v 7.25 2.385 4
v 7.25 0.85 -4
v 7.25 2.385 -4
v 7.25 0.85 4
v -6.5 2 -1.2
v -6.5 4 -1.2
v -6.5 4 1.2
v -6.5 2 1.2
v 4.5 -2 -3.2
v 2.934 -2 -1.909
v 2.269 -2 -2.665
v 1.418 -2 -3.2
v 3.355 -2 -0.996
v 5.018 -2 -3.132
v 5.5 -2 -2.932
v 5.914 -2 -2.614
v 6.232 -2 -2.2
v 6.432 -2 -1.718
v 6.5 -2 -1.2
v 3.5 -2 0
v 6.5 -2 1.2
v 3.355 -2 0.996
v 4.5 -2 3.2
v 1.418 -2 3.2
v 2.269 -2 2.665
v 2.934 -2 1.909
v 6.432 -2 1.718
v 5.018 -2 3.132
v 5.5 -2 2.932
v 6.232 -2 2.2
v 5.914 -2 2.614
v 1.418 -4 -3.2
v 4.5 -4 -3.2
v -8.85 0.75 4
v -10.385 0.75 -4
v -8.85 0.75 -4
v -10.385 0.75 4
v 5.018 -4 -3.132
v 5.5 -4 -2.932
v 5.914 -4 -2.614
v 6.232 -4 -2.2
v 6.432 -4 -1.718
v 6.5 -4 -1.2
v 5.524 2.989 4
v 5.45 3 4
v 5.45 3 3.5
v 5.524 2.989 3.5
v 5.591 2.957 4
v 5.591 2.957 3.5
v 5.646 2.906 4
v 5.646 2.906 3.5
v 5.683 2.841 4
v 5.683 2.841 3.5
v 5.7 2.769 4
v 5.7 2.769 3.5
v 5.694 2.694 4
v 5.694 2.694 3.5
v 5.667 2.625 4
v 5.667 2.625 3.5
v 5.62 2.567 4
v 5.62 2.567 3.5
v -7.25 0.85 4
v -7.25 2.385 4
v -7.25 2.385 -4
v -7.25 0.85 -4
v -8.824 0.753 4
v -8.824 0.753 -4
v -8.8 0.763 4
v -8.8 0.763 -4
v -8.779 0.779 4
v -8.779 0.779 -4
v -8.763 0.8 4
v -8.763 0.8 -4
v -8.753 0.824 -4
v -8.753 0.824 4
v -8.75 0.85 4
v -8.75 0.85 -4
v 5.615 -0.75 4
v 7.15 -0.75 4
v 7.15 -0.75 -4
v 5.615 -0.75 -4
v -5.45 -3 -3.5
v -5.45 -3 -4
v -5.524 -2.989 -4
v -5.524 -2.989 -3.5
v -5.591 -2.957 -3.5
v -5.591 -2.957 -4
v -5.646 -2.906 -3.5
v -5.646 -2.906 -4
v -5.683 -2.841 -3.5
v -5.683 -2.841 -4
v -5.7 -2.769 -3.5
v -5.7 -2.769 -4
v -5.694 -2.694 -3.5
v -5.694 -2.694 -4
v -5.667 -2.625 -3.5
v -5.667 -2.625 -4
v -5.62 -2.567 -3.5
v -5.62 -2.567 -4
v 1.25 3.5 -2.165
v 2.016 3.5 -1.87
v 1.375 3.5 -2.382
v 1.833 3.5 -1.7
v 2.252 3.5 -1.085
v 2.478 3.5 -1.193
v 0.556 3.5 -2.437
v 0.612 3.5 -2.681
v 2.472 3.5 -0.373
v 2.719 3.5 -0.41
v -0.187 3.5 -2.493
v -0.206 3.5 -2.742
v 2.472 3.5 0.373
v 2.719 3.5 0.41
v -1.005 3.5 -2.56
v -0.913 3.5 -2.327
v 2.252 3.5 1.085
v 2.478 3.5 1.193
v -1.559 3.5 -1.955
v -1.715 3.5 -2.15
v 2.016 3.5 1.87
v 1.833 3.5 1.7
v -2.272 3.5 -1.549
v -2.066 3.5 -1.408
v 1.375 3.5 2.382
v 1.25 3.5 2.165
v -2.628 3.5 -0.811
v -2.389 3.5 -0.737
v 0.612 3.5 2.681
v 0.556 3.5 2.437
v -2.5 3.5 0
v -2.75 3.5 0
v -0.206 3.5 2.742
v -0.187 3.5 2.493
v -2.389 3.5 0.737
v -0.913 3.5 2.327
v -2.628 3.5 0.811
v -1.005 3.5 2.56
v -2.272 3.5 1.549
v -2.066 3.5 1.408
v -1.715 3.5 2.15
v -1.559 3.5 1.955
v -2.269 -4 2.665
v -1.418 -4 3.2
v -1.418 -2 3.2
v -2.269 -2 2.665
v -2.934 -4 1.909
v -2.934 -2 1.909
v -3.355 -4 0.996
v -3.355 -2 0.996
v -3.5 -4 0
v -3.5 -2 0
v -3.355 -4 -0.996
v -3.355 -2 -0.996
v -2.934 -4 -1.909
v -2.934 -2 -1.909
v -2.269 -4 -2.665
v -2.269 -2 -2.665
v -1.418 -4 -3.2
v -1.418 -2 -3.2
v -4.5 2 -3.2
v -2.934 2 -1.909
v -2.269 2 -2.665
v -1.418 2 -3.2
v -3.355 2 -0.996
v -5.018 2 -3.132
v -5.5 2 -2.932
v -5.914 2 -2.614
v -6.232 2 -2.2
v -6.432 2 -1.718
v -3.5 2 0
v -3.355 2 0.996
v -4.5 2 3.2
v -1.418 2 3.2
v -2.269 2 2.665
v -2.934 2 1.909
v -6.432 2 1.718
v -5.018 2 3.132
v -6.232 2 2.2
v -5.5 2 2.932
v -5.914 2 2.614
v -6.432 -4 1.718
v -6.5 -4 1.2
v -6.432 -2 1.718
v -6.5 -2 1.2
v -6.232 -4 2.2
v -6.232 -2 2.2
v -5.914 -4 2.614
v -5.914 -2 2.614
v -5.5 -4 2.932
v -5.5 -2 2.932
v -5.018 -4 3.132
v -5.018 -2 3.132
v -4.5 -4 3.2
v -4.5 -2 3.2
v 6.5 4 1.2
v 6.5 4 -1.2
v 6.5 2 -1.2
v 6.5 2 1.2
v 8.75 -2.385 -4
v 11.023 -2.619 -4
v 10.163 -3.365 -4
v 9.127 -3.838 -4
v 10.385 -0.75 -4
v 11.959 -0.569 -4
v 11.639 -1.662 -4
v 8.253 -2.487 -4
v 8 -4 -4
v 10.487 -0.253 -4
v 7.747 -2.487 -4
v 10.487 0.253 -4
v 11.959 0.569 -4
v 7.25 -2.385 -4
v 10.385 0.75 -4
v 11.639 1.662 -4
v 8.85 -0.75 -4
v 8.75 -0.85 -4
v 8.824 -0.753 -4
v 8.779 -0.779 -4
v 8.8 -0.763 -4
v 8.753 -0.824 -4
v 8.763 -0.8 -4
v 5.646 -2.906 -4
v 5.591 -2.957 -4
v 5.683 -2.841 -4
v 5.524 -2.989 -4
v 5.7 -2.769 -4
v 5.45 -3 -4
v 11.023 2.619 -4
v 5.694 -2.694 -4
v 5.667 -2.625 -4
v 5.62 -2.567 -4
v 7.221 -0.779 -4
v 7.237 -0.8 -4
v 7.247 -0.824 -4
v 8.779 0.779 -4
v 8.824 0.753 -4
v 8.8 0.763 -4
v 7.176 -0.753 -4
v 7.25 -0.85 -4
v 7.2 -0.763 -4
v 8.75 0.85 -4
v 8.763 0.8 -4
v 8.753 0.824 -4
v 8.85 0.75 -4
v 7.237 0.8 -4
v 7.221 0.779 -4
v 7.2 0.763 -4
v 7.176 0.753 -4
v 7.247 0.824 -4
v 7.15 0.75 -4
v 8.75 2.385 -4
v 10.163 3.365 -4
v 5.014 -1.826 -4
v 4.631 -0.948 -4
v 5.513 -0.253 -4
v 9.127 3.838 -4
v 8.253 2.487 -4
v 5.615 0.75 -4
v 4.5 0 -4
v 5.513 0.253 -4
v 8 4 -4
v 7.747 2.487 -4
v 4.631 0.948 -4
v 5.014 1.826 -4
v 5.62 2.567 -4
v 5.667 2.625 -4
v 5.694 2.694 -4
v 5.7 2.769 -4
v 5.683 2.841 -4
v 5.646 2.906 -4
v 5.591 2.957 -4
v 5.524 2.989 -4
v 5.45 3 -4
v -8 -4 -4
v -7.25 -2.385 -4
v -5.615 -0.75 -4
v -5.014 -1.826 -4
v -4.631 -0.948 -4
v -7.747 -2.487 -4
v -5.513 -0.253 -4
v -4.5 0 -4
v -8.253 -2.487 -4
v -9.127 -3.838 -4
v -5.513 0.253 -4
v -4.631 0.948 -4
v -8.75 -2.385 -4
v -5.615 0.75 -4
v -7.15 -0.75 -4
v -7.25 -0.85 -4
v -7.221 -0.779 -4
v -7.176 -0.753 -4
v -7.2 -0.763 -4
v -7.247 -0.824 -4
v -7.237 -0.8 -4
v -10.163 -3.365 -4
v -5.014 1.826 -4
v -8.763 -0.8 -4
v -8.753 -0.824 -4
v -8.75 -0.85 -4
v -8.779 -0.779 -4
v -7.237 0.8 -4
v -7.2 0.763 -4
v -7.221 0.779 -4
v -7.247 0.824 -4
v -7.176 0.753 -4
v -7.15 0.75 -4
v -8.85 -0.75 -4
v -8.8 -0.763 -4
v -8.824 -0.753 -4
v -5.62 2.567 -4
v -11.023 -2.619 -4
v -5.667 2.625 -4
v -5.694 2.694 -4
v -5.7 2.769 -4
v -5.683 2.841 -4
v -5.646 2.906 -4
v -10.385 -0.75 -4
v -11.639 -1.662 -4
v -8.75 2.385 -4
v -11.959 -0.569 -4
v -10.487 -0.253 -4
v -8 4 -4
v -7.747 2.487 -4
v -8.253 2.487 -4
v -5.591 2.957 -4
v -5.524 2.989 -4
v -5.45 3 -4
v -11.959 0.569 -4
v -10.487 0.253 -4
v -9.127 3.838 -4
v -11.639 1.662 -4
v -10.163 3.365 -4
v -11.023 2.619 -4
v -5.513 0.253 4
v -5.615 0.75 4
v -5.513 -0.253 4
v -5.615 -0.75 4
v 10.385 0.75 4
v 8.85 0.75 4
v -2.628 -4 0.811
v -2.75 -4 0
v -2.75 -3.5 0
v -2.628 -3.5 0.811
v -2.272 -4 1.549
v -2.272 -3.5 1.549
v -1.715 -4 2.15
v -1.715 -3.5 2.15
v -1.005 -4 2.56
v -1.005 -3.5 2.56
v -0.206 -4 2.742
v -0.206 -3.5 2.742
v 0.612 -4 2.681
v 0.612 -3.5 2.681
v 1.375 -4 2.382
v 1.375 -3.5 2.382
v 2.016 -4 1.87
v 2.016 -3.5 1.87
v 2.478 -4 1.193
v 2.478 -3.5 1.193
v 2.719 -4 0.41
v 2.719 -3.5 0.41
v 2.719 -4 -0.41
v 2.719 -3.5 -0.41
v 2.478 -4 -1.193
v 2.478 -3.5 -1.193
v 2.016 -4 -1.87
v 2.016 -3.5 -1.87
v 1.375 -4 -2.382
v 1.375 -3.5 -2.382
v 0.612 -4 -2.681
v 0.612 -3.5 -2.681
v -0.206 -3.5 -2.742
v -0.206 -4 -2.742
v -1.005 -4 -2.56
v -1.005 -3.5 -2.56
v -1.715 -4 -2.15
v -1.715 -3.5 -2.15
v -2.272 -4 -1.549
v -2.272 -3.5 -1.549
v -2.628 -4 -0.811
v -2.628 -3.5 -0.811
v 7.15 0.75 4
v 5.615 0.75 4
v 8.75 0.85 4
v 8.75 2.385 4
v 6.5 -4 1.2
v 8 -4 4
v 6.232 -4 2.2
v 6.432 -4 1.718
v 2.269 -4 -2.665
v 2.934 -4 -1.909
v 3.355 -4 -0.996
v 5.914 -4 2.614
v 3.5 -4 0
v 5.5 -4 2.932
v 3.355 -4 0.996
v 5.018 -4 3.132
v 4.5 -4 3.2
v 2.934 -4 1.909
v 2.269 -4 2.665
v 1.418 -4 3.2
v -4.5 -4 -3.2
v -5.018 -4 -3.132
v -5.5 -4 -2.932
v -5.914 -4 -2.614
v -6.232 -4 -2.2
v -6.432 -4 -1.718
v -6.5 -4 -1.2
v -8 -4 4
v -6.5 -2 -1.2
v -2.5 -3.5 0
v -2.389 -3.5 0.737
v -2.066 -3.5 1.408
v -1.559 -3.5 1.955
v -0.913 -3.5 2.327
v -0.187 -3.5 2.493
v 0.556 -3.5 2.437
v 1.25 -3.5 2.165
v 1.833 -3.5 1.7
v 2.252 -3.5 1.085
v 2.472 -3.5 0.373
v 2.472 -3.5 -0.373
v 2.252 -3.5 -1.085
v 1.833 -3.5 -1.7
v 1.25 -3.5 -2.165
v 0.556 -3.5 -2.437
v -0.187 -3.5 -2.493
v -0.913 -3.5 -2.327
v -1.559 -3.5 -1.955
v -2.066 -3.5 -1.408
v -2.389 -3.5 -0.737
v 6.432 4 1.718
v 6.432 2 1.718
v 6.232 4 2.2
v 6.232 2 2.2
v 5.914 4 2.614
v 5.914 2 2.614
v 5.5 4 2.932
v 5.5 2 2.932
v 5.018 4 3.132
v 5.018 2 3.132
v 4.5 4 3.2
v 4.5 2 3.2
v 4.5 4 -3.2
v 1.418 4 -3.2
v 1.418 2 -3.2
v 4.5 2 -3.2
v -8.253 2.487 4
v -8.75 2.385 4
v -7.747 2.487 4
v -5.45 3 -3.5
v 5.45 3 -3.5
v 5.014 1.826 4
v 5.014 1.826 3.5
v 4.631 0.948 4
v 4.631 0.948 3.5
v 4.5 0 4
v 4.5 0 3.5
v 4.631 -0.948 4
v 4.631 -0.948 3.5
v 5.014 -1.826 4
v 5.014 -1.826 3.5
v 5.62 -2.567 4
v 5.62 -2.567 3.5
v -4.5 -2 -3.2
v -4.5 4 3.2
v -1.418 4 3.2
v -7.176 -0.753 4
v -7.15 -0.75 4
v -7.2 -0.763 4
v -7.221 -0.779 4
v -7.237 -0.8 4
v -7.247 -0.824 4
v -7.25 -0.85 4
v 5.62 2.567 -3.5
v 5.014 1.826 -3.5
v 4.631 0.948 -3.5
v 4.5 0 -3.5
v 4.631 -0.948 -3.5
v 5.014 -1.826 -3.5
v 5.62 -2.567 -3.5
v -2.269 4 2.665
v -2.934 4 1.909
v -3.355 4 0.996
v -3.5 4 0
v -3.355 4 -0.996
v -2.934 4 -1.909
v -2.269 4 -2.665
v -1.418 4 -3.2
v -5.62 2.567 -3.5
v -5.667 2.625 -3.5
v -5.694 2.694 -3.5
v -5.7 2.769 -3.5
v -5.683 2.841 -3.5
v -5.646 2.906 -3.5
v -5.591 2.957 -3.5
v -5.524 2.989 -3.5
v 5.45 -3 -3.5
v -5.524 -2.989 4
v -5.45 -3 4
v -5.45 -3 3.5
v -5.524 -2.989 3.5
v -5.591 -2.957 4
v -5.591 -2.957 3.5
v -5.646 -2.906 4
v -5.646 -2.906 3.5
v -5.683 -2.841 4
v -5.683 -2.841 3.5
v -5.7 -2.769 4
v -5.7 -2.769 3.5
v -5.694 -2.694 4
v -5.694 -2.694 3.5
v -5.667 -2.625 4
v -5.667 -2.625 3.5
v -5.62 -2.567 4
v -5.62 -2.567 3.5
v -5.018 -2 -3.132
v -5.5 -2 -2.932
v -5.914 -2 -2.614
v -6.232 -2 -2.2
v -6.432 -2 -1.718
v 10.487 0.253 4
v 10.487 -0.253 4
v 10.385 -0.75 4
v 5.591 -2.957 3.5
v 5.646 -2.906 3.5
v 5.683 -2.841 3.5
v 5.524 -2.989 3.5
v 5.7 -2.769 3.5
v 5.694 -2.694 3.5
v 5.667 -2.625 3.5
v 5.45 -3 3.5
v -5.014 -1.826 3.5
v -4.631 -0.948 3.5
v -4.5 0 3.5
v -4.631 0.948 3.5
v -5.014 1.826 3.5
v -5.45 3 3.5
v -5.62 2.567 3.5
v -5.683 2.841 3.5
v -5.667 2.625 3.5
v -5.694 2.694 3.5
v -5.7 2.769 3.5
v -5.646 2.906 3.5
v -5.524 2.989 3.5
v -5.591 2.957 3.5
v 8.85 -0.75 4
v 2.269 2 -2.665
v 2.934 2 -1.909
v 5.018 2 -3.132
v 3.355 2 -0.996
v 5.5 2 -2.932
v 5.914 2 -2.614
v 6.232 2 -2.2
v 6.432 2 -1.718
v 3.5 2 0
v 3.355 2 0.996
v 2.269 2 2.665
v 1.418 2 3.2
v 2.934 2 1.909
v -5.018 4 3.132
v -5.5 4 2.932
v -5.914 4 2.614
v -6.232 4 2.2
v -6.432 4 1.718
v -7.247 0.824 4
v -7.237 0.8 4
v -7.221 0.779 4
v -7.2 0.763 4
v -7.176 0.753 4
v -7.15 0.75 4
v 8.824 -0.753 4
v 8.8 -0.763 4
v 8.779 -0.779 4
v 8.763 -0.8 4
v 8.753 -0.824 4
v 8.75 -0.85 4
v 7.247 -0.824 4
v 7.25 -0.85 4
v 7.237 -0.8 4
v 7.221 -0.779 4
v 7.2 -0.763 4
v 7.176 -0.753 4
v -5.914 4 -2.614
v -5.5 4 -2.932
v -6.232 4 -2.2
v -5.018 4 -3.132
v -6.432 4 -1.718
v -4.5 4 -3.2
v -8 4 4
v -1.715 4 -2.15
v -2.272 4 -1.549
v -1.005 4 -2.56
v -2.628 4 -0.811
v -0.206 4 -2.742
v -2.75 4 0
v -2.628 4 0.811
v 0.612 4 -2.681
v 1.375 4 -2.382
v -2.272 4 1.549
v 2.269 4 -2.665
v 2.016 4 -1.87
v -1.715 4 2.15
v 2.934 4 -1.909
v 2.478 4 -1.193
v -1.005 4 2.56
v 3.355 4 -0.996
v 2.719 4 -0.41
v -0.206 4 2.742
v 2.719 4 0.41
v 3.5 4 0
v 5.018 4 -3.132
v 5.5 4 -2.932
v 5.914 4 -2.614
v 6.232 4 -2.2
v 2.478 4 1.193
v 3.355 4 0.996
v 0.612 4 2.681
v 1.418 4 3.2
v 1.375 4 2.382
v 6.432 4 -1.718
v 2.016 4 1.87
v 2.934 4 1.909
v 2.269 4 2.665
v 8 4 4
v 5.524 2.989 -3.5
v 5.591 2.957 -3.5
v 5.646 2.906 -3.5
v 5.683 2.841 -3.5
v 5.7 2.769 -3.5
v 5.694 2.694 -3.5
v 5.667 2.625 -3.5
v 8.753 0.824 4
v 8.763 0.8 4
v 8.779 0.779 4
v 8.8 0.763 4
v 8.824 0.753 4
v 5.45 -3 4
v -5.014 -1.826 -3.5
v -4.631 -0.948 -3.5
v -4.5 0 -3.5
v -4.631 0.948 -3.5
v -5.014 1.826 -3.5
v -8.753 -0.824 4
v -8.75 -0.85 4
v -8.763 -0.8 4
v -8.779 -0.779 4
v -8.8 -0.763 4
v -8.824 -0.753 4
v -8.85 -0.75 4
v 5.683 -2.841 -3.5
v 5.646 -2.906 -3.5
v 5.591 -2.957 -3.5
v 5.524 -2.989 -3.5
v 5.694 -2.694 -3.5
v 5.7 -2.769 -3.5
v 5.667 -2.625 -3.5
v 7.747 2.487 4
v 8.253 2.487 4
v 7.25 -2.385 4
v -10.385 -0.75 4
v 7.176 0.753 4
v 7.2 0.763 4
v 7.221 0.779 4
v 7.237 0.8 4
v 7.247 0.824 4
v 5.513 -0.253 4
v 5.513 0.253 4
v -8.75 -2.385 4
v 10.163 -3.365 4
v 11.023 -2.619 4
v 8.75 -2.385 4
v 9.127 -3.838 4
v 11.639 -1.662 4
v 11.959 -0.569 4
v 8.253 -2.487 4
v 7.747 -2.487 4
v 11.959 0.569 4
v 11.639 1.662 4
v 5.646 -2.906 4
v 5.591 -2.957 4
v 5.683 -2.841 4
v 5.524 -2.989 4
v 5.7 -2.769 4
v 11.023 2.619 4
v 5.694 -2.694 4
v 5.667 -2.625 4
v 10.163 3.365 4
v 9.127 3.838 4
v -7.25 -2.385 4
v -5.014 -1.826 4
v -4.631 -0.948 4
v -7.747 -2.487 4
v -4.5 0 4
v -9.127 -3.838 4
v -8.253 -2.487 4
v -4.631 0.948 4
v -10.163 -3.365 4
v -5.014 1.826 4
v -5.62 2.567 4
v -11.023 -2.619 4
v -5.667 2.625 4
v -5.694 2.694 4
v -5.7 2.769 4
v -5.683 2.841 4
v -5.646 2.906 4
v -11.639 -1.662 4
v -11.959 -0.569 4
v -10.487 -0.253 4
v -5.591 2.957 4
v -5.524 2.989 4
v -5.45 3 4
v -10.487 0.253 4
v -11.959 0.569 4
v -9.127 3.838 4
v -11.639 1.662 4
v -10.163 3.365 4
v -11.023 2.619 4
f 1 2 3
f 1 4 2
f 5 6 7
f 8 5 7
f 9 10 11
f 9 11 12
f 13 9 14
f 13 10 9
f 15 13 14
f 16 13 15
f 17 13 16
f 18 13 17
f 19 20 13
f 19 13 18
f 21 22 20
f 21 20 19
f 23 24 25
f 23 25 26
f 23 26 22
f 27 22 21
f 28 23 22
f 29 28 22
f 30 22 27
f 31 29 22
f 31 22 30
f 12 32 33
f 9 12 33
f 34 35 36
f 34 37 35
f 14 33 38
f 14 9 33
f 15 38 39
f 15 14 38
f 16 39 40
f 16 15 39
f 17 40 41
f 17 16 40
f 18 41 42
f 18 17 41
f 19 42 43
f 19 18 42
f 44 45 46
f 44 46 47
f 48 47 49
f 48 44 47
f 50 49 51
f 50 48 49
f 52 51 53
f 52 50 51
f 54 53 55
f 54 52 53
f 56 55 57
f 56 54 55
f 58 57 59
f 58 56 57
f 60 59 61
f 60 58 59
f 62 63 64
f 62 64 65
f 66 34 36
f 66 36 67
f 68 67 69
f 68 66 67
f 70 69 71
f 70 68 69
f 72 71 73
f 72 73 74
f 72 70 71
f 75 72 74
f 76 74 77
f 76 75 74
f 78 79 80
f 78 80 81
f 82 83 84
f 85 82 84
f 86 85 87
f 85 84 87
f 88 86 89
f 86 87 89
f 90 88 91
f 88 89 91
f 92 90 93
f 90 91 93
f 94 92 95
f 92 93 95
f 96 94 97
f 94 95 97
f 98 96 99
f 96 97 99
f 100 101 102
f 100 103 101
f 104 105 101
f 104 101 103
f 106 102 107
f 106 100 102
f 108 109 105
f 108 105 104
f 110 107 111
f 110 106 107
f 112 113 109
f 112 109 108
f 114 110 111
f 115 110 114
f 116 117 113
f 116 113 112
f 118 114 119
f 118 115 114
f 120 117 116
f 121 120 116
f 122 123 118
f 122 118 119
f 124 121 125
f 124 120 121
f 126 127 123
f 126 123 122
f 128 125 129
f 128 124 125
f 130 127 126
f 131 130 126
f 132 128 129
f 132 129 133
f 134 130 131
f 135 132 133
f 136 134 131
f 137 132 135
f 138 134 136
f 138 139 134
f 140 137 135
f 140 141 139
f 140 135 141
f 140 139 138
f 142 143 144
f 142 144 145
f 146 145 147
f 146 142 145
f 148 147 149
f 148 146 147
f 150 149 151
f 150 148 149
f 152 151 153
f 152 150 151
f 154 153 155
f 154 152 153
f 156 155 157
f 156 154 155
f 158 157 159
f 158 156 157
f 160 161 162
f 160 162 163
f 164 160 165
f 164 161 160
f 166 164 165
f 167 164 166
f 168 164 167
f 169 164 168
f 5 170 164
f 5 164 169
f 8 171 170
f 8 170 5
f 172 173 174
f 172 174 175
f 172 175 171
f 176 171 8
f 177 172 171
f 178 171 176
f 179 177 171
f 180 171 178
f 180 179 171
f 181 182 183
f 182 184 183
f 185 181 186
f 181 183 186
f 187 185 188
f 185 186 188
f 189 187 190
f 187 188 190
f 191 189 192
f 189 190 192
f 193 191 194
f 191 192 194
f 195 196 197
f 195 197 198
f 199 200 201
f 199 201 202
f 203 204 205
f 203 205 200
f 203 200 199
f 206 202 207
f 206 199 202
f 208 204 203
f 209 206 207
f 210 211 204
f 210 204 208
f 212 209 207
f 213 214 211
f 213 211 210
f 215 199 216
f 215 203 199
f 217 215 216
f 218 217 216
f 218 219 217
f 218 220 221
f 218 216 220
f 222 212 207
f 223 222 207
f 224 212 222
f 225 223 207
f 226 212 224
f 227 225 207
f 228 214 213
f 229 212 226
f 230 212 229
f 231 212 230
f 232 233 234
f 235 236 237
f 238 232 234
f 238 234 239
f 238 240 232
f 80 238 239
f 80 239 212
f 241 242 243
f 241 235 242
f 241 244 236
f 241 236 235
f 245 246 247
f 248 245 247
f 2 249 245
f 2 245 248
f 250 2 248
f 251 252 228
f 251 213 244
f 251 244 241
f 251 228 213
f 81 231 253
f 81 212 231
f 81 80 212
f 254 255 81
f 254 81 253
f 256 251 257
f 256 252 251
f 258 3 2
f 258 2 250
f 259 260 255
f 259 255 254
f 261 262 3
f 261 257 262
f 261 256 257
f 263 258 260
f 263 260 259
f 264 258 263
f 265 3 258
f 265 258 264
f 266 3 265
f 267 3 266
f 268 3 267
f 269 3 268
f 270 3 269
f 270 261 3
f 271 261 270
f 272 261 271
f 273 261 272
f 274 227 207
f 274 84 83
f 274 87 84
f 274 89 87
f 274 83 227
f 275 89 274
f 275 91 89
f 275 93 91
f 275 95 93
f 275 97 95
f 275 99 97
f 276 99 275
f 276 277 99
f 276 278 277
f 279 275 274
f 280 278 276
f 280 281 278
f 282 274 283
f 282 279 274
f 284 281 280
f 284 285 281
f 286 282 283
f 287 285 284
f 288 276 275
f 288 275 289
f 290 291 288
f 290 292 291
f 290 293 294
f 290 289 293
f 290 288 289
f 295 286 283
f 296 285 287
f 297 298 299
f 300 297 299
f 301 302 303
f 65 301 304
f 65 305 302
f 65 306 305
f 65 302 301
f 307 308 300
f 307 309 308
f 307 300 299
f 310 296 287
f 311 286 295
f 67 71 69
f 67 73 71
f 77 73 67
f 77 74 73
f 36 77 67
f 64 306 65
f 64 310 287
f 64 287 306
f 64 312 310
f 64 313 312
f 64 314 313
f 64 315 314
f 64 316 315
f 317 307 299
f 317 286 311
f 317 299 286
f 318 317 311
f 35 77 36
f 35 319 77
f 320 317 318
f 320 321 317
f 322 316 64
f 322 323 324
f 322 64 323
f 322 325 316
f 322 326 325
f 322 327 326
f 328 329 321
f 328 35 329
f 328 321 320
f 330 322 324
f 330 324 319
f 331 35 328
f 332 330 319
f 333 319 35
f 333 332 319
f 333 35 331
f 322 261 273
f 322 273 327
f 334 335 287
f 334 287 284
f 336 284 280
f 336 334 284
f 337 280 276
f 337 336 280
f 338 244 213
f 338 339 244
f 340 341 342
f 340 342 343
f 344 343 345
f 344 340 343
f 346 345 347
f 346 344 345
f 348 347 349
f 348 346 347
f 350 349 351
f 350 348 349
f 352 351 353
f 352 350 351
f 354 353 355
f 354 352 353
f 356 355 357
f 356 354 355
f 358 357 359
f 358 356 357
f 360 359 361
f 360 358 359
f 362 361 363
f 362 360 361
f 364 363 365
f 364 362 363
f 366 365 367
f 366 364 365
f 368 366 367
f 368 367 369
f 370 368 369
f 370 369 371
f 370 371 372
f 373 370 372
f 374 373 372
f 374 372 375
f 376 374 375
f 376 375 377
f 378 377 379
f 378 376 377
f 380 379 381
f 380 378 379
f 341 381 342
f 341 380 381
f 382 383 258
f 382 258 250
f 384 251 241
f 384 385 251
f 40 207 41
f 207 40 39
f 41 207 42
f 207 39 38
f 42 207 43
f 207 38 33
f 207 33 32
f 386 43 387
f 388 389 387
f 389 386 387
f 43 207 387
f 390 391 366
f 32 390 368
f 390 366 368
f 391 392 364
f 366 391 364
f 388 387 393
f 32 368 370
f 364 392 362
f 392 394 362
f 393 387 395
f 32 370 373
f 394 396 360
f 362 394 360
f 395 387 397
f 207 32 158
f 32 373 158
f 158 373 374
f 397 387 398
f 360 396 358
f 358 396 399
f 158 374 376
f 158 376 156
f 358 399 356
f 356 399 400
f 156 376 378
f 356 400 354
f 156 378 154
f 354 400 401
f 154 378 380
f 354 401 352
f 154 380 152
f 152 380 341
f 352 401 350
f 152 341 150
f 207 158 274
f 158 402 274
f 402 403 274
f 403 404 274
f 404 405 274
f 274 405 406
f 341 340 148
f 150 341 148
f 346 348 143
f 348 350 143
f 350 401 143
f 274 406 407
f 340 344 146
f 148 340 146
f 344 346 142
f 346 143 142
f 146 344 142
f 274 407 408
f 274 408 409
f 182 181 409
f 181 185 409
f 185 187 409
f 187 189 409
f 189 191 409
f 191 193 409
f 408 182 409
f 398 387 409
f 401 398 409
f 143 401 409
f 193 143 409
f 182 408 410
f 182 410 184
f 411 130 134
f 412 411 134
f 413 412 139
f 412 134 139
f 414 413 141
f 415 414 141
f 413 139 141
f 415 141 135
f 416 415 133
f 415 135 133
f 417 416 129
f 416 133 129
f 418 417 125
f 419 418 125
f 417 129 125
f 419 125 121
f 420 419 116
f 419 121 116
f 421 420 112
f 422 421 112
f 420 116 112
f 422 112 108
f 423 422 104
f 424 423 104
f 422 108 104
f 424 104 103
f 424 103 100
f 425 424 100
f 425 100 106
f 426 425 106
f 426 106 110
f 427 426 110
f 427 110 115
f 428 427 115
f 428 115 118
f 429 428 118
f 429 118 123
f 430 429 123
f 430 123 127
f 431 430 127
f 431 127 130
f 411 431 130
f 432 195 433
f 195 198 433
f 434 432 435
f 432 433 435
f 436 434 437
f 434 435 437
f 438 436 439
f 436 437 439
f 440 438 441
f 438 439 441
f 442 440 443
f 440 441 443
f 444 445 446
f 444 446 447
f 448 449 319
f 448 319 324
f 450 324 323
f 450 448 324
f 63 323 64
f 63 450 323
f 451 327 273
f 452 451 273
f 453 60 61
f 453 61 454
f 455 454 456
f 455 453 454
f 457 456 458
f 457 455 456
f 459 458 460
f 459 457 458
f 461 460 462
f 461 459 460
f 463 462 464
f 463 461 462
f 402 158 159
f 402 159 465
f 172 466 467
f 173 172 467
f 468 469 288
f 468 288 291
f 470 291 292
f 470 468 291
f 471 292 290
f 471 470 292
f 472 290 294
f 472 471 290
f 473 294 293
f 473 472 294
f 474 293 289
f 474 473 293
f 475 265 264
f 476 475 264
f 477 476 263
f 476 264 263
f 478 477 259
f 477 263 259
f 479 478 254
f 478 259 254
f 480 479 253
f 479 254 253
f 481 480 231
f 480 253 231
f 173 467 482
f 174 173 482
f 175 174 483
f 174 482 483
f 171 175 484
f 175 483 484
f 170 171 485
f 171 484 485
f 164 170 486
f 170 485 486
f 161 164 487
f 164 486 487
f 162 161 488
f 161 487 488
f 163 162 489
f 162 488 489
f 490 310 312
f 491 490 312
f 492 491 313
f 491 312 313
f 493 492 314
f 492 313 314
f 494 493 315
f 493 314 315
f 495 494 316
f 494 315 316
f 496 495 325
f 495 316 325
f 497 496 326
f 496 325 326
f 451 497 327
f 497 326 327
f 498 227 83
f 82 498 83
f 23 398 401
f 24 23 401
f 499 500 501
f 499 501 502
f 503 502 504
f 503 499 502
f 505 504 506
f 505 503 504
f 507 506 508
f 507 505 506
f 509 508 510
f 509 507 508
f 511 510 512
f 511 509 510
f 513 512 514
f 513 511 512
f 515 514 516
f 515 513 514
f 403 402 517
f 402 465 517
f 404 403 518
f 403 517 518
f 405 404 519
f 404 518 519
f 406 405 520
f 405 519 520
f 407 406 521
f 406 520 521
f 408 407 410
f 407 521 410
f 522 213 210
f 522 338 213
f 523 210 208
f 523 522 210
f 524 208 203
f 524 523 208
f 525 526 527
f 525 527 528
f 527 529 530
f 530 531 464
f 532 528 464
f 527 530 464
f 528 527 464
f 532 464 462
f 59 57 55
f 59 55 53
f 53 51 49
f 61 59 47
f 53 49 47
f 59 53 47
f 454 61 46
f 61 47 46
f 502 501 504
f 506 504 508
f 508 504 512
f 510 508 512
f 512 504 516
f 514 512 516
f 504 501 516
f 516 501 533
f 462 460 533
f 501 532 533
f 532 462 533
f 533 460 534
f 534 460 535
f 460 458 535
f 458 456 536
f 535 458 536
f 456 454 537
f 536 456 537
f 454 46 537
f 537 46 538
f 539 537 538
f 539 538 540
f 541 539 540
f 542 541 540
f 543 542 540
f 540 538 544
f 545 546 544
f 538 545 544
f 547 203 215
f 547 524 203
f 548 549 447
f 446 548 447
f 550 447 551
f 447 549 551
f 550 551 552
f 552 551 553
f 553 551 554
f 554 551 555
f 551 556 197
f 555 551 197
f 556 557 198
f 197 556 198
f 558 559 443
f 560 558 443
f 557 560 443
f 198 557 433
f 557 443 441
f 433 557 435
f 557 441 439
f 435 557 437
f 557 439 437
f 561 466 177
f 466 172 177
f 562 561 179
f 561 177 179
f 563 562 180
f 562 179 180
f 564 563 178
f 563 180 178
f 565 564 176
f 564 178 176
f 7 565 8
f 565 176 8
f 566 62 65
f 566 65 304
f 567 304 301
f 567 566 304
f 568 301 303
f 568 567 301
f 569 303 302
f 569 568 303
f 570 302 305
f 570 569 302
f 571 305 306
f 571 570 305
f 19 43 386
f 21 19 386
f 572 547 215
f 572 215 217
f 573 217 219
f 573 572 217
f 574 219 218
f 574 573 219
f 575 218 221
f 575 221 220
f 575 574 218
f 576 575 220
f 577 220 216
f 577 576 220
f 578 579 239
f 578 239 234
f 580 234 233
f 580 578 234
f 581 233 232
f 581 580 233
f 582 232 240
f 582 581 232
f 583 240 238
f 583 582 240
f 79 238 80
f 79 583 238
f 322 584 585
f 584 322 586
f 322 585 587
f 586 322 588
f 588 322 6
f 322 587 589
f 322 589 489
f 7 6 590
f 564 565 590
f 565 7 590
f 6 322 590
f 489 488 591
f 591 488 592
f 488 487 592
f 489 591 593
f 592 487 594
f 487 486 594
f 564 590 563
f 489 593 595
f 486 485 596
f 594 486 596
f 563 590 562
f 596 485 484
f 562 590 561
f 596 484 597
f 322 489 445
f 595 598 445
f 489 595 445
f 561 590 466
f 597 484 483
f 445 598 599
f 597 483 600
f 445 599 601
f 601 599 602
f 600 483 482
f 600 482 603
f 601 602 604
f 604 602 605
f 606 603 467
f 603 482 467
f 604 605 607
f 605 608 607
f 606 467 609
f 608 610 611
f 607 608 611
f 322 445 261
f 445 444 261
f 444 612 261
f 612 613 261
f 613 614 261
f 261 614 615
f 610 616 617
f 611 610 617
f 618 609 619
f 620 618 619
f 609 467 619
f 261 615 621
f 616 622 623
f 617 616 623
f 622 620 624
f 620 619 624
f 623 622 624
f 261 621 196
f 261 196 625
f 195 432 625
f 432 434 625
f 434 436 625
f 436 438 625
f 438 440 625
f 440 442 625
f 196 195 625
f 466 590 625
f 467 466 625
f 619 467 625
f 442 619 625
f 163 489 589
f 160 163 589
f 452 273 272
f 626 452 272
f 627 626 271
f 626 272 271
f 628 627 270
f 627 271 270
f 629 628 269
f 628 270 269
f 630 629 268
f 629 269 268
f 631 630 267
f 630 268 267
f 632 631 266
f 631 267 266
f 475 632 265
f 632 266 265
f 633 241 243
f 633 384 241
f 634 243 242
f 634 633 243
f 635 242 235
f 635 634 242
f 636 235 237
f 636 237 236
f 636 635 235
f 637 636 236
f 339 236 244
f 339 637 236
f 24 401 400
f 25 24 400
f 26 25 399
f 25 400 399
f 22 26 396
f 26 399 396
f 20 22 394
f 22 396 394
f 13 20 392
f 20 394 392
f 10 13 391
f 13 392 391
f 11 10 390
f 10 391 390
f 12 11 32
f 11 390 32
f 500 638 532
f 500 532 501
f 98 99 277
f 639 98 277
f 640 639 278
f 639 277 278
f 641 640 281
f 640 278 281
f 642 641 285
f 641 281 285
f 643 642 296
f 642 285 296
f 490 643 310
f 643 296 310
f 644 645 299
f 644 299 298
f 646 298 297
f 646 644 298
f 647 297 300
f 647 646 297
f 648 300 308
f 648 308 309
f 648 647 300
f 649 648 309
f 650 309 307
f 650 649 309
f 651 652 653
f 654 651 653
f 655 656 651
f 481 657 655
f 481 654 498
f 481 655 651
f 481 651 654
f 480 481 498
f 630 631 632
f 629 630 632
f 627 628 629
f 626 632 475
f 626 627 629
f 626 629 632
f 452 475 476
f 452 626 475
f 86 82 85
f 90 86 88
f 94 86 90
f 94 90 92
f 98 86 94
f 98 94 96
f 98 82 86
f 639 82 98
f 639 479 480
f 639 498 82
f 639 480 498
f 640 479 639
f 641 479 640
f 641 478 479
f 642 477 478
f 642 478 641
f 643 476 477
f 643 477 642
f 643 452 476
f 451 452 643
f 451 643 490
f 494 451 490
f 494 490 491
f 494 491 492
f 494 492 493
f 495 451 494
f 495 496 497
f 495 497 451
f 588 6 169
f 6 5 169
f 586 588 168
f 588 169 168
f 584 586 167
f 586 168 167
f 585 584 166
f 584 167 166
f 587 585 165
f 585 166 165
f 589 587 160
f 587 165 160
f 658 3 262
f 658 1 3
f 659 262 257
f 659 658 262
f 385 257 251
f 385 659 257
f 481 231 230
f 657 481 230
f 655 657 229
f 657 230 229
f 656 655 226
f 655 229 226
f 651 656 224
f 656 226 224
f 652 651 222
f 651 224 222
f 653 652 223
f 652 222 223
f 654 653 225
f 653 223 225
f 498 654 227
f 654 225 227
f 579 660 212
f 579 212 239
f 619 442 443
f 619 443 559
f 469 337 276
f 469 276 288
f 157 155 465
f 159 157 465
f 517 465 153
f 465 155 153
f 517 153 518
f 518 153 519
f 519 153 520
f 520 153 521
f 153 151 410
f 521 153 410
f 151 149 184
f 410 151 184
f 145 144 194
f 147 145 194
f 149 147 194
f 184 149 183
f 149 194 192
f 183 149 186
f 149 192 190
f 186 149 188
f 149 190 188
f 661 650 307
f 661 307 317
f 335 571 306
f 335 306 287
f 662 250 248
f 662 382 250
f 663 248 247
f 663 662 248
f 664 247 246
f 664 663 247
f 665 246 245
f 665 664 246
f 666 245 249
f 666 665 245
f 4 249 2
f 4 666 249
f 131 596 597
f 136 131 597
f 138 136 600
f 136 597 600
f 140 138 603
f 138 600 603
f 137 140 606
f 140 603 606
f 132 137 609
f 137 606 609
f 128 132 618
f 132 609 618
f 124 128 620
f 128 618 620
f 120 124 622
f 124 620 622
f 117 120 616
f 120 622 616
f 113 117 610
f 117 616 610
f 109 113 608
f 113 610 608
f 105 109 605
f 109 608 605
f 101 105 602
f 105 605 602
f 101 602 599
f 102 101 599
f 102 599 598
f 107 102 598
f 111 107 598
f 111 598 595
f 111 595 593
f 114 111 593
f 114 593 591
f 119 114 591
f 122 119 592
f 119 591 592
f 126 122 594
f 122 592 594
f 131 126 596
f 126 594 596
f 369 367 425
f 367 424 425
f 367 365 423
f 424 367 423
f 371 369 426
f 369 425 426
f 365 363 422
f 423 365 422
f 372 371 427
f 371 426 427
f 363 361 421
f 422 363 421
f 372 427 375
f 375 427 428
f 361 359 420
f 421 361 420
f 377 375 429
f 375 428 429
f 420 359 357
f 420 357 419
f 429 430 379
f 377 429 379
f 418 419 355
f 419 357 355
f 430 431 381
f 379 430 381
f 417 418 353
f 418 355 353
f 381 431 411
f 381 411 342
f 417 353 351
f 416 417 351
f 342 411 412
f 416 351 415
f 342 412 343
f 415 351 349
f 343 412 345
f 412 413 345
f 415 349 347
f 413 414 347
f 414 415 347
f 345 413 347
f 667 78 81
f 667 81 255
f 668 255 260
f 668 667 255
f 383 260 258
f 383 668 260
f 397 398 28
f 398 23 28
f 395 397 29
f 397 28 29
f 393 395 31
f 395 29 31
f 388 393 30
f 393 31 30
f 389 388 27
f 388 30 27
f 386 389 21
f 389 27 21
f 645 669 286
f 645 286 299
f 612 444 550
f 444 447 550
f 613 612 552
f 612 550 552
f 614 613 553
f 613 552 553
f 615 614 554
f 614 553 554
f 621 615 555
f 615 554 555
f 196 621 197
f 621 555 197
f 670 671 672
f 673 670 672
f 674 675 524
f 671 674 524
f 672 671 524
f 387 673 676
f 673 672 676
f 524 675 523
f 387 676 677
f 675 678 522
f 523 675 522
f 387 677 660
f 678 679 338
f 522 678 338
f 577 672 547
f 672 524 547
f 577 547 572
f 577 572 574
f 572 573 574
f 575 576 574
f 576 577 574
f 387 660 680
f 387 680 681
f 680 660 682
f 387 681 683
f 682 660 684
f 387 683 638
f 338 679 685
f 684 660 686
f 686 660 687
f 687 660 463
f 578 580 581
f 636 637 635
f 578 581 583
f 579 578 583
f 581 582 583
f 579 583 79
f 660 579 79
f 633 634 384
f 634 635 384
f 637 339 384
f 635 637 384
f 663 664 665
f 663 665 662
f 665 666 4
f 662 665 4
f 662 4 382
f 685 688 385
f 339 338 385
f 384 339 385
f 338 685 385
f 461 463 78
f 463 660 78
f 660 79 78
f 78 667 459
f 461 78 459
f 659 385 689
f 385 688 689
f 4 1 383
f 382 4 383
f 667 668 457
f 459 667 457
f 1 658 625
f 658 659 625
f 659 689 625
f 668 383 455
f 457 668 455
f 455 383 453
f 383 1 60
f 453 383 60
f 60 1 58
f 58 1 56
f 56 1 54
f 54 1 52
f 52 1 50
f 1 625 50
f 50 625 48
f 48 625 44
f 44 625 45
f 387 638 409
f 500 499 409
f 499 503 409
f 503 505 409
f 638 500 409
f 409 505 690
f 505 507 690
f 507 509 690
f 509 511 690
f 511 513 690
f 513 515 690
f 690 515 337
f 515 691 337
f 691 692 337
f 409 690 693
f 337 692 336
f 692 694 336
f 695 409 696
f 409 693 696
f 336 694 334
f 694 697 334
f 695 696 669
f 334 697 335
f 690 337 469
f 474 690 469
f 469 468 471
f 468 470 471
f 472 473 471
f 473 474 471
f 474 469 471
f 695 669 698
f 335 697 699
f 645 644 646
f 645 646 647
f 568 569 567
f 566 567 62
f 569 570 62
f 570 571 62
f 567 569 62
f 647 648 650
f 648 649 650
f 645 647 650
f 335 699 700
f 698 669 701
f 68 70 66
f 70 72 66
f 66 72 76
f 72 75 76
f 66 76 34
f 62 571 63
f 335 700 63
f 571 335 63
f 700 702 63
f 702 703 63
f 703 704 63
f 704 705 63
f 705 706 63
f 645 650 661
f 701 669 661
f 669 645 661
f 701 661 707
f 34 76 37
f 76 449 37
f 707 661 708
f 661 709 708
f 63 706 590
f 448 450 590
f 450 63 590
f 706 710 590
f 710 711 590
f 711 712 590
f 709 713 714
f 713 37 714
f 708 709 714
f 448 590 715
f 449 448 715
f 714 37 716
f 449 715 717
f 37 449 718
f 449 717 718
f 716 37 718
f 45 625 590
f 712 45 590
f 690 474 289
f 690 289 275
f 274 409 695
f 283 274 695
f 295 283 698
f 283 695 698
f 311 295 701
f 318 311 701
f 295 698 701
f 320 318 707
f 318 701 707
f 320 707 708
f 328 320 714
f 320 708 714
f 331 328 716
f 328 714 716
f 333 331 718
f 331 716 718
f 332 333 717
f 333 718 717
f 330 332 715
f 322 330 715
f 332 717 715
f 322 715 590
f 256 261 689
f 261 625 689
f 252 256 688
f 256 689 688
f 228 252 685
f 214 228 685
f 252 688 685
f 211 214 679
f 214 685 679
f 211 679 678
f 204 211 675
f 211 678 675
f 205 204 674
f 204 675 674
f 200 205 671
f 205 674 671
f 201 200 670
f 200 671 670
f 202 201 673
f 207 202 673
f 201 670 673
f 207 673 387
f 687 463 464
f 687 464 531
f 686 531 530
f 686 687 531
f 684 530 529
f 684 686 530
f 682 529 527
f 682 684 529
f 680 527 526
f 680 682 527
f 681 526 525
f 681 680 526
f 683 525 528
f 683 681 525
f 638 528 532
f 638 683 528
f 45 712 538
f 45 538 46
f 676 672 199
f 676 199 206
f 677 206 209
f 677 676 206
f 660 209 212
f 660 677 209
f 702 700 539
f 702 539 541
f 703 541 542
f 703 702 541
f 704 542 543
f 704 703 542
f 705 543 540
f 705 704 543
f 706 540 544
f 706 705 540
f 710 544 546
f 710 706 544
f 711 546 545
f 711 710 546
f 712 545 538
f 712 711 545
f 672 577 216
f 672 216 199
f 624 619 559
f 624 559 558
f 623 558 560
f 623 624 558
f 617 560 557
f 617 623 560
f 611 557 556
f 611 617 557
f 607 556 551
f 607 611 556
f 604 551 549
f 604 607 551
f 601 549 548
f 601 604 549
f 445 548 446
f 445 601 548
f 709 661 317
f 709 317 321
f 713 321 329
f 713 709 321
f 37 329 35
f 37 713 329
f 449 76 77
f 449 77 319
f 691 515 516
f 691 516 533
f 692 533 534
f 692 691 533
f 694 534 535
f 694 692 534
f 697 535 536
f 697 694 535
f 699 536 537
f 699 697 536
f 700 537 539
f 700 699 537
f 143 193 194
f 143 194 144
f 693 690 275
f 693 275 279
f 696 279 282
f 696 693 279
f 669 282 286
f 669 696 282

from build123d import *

# Parameters (mm, degrees)
EXTRUIR1_DEPTH         = 4
CROQUIS2_R             = 2.5
CORTAR_EXTRUIR1_DEPTH  = 9
CROQUIS3_R             = 2.75
CORTAR_EXTRUIR2_DEPTH  = 0.5
CORTAR_EXTRUIR3_DEPTH  = 2
SIMETR_A3_COPY_1_DEPTH = 2
REDONDEO1_R            = 2
CORTAR_EXTRUIR4_DEPTH  = 0.5


with BuildPart() as part:
    # Croquis1 → Extruir1 (new body, symmetric)
    with BuildSketch(Plane.XY):
        with BuildLine():
            Line((-8, 4), (8, 4))
            ThreePointArc((8, 4), (12, 0), (8, -4))
            Line((8, -4), (-8, -4))
            ThreePointArc((-8, -4), (-12, 0), (-8, 4))
        make_face()
        with BuildLine():
            Line((10.384848004, -0.75), (8.85, -0.75))
            ThreePointArc((8.85, -0.75), (8.779289322, -0.779289322), (8.75, -0.85))
            Line((8.75, -0.85), (8.75, -2.384848004))
            ThreePointArc((8.75, -2.384848004), (8, -2.5), (7.25, -2.384848004))
            Line((7.25, -2.384848004), (7.25, -0.85))
            ThreePointArc((7.25, -0.85), (7.220710678, -0.779289322), (7.15, -0.75))
            Line((7.15, -0.75), (5.615151996, -0.75))
            ThreePointArc((5.615151996, -0.75), (5.5, 0), (5.615151996, 0.75))
            Line((5.615151996, 0.75), (7.15, 0.75))
            ThreePointArc((7.15, 0.75), (7.220710678, 0.779289322), (7.25, 0.85))
            Line((7.25, 0.85), (7.25, 2.384848004))
            ThreePointArc((7.25, 2.384848004), (8, 2.5), (8.75, 2.384848004))
            Line((8.75, 2.384848004), (8.75, 0.85))
            ThreePointArc((8.75, 0.85), (8.779289322, 0.779289322), (8.85, 0.75))
            Line((8.85, 0.75), (10.384848004, 0.75))
            ThreePointArc((10.384848004, 0.75), (10.5, 0), (10.384848004, -0.75))
        make_face(mode=Mode.SUBTRACT)
        with BuildLine():
            Line((-10.384848004, 0.75), (-8.85, 0.75))
            ThreePointArc((-8.85, 0.75), (-8.779289322, 0.779289322), (-8.75, 0.85))
            Line((-8.75, 0.85), (-8.75, 2.384848004))
            ThreePointArc((-8.75, 2.384848004), (-8, 2.5), (-7.25, 2.384848004))
            Line((-7.25, 2.384848004), (-7.25, 0.85))
            ThreePointArc((-7.25, 0.85), (-7.220710678, 0.779289322), (-7.15, 0.75))
            Line((-7.15, 0.75), (-5.615151996, 0.75))
            ThreePointArc((-5.615151996, 0.75), (-5.5, 0), (-5.615151996, -0.75))
            Line((-5.615151996, -0.75), (-7.15, -0.75))
            ThreePointArc((-7.15, -0.75), (-7.220710678, -0.779289322), (-7.25, -0.85))
            Line((-7.25, -0.85), (-7.25, -2.384848004))
            ThreePointArc((-7.25, -2.384848004), (-8, -2.5), (-8.75, -2.384848004))
            Line((-8.75, -2.384848004), (-8.75, -0.85))
            ThreePointArc((-8.75, -0.85), (-8.779289322, -0.779289322), (-8.85, -0.75))
            Line((-8.85, -0.75), (-10.384848004, -0.75))
            ThreePointArc((-10.384848004, -0.75), (-10.5, 0), (-10.384848004, 0.75))
        make_face(mode=Mode.SUBTRACT)
    extrude(amount=EXTRUIR1_DEPTH, both=True)

    # Croquis2 → Cortar-Extruir1 (cut, through all)
    with BuildSketch(Plane(origin=(0, 4, 0), x_dir=(-1, 0, 0), z_dir=(0, 1, 0))):
        Circle(CROQUIS2_R)
    extrude(amount=-CORTAR_EXTRUIR1_DEPTH, mode=Mode.SUBTRACT)

    # Croquis3 → Cortar-Extruir2 (cut)
    with BuildSketch(Plane(origin=(0, 4, 0), x_dir=(-1, 0, 0), z_dir=(0, 1, 0))):
        Circle(CROQUIS3_R)
    cortar_extruir2 = extrude(amount=-CORTAR_EXTRUIR2_DEPTH, mode=Mode.SUBTRACT)

    # Simetría1: Cortar-Extruir2 across plane
    add(cortar_extruir2.mirror(Plane.ZX), mode=Mode.SUBTRACT)

    # Croquis4 → Cortar-Extruir3 (cut)
    with BuildSketch(Plane(origin=(0, 4, 0), x_dir=(-1, 0, 0), z_dir=(0, 1, 0))):
        with BuildLine():
            Line((-1.417744688, -3.2), (-6.5, -3.2))
            Line((-6.5, -3.2), (-6.5, 3.2))
            Line((-6.5, 3.2), (-1.417744688, 3.2))
            ThreePointArc((-1.417744688, 3.2), (-3.5, 0), (-1.417744688, -3.2))
        make_face()
    cortar_extruir3 = extrude(amount=-CORTAR_EXTRUIR3_DEPTH, mode=Mode.SUBTRACT)

    # Simetría2: Cortar-Extruir3 across plane
    add(cortar_extruir3.mirror(Plane(origin=(0, 0, 0), x_dir=(0, 0, 1), z_dir=(1, 0, 0))), mode=Mode.SUBTRACT)

    # Simetría3: Cortar-Extruir3 across plane
    add(cortar_extruir3.mirror(Plane.ZX), mode=Mode.SUBTRACT)

    # Simetría3 copy 1 sketch → Simetría3 copy 1 (cut)
    with BuildSketch(Plane.XZ.offset(4)):
        with BuildLine():
            Line((-1.417744688, -3.2), (-6.5, -3.2))
            Line((-6.5, -3.2), (-6.5, 3.2))
            Line((-6.5, 3.2), (-1.417744688, 3.2))
            ThreePointArc((-1.417744688, 3.2), (-3.5, 0), (-1.417744688, -3.2))
        make_face()
    extrude(amount=-SIMETR_A3_COPY_1_DEPTH, mode=Mode.SUBTRACT)

    # Redondeo1
    redondeo1_edges = [part.edges().sort_by_distance(p)[0] for p in [
        (6.5, 3, -3.2),
        (6.5, 3, 3.2),
        (-6.5, 3, 3.2),
        (-6.5, 3, -3.2),
        (-6.5, -3, -3.2),
        (-6.5, -3, 3.2),
        (6.5, -3, 3.2),
        (6.5, -3, -3.2),
    ]]
    fillet(redondeo1_edges, radius=REDONDEO1_R)

    # Croquis5 → Cortar-Extruir4 (cut)
    with BuildSketch(Plane.XY.offset(4)):
        with BuildLine():
            Line((-5.450490243, 3), (5.450490243, 3))
            ThreePointArc((5.450490243, 3), (5.683227577, 2.841287093), (5.62045756, 2.566666667))
            ThreePointArc((5.62045756, 2.566666667), (4.5, 0), (5.62045756, -2.566666667))
            ThreePointArc((5.62045756, -2.566666667), (5.683227577, -2.841287093), (5.450490243, -3))
            Line((5.450490243, -3), (-5.450490243, -3))
            ThreePointArc((-5.450490243, -3), (-5.683227577, -2.841287093), (-5.62045756, -2.566666667))
            ThreePointArc((-5.62045756, -2.566666667), (-4.5, 0), (-5.62045756, 2.566666667))
            ThreePointArc((-5.62045756, 2.566666667), (-5.683227577, 2.841287093), (-5.450490243, 3))
        make_face()
    cortar_extruir4 = extrude(amount=-CORTAR_EXTRUIR4_DEPTH, mode=Mode.SUBTRACT)

    # Simetría4: Cortar-Extruir4 across plane
    add(cortar_extruir4.mirror(Plane.XY), mode=Mode.SUBTRACT)


solid = part.part
